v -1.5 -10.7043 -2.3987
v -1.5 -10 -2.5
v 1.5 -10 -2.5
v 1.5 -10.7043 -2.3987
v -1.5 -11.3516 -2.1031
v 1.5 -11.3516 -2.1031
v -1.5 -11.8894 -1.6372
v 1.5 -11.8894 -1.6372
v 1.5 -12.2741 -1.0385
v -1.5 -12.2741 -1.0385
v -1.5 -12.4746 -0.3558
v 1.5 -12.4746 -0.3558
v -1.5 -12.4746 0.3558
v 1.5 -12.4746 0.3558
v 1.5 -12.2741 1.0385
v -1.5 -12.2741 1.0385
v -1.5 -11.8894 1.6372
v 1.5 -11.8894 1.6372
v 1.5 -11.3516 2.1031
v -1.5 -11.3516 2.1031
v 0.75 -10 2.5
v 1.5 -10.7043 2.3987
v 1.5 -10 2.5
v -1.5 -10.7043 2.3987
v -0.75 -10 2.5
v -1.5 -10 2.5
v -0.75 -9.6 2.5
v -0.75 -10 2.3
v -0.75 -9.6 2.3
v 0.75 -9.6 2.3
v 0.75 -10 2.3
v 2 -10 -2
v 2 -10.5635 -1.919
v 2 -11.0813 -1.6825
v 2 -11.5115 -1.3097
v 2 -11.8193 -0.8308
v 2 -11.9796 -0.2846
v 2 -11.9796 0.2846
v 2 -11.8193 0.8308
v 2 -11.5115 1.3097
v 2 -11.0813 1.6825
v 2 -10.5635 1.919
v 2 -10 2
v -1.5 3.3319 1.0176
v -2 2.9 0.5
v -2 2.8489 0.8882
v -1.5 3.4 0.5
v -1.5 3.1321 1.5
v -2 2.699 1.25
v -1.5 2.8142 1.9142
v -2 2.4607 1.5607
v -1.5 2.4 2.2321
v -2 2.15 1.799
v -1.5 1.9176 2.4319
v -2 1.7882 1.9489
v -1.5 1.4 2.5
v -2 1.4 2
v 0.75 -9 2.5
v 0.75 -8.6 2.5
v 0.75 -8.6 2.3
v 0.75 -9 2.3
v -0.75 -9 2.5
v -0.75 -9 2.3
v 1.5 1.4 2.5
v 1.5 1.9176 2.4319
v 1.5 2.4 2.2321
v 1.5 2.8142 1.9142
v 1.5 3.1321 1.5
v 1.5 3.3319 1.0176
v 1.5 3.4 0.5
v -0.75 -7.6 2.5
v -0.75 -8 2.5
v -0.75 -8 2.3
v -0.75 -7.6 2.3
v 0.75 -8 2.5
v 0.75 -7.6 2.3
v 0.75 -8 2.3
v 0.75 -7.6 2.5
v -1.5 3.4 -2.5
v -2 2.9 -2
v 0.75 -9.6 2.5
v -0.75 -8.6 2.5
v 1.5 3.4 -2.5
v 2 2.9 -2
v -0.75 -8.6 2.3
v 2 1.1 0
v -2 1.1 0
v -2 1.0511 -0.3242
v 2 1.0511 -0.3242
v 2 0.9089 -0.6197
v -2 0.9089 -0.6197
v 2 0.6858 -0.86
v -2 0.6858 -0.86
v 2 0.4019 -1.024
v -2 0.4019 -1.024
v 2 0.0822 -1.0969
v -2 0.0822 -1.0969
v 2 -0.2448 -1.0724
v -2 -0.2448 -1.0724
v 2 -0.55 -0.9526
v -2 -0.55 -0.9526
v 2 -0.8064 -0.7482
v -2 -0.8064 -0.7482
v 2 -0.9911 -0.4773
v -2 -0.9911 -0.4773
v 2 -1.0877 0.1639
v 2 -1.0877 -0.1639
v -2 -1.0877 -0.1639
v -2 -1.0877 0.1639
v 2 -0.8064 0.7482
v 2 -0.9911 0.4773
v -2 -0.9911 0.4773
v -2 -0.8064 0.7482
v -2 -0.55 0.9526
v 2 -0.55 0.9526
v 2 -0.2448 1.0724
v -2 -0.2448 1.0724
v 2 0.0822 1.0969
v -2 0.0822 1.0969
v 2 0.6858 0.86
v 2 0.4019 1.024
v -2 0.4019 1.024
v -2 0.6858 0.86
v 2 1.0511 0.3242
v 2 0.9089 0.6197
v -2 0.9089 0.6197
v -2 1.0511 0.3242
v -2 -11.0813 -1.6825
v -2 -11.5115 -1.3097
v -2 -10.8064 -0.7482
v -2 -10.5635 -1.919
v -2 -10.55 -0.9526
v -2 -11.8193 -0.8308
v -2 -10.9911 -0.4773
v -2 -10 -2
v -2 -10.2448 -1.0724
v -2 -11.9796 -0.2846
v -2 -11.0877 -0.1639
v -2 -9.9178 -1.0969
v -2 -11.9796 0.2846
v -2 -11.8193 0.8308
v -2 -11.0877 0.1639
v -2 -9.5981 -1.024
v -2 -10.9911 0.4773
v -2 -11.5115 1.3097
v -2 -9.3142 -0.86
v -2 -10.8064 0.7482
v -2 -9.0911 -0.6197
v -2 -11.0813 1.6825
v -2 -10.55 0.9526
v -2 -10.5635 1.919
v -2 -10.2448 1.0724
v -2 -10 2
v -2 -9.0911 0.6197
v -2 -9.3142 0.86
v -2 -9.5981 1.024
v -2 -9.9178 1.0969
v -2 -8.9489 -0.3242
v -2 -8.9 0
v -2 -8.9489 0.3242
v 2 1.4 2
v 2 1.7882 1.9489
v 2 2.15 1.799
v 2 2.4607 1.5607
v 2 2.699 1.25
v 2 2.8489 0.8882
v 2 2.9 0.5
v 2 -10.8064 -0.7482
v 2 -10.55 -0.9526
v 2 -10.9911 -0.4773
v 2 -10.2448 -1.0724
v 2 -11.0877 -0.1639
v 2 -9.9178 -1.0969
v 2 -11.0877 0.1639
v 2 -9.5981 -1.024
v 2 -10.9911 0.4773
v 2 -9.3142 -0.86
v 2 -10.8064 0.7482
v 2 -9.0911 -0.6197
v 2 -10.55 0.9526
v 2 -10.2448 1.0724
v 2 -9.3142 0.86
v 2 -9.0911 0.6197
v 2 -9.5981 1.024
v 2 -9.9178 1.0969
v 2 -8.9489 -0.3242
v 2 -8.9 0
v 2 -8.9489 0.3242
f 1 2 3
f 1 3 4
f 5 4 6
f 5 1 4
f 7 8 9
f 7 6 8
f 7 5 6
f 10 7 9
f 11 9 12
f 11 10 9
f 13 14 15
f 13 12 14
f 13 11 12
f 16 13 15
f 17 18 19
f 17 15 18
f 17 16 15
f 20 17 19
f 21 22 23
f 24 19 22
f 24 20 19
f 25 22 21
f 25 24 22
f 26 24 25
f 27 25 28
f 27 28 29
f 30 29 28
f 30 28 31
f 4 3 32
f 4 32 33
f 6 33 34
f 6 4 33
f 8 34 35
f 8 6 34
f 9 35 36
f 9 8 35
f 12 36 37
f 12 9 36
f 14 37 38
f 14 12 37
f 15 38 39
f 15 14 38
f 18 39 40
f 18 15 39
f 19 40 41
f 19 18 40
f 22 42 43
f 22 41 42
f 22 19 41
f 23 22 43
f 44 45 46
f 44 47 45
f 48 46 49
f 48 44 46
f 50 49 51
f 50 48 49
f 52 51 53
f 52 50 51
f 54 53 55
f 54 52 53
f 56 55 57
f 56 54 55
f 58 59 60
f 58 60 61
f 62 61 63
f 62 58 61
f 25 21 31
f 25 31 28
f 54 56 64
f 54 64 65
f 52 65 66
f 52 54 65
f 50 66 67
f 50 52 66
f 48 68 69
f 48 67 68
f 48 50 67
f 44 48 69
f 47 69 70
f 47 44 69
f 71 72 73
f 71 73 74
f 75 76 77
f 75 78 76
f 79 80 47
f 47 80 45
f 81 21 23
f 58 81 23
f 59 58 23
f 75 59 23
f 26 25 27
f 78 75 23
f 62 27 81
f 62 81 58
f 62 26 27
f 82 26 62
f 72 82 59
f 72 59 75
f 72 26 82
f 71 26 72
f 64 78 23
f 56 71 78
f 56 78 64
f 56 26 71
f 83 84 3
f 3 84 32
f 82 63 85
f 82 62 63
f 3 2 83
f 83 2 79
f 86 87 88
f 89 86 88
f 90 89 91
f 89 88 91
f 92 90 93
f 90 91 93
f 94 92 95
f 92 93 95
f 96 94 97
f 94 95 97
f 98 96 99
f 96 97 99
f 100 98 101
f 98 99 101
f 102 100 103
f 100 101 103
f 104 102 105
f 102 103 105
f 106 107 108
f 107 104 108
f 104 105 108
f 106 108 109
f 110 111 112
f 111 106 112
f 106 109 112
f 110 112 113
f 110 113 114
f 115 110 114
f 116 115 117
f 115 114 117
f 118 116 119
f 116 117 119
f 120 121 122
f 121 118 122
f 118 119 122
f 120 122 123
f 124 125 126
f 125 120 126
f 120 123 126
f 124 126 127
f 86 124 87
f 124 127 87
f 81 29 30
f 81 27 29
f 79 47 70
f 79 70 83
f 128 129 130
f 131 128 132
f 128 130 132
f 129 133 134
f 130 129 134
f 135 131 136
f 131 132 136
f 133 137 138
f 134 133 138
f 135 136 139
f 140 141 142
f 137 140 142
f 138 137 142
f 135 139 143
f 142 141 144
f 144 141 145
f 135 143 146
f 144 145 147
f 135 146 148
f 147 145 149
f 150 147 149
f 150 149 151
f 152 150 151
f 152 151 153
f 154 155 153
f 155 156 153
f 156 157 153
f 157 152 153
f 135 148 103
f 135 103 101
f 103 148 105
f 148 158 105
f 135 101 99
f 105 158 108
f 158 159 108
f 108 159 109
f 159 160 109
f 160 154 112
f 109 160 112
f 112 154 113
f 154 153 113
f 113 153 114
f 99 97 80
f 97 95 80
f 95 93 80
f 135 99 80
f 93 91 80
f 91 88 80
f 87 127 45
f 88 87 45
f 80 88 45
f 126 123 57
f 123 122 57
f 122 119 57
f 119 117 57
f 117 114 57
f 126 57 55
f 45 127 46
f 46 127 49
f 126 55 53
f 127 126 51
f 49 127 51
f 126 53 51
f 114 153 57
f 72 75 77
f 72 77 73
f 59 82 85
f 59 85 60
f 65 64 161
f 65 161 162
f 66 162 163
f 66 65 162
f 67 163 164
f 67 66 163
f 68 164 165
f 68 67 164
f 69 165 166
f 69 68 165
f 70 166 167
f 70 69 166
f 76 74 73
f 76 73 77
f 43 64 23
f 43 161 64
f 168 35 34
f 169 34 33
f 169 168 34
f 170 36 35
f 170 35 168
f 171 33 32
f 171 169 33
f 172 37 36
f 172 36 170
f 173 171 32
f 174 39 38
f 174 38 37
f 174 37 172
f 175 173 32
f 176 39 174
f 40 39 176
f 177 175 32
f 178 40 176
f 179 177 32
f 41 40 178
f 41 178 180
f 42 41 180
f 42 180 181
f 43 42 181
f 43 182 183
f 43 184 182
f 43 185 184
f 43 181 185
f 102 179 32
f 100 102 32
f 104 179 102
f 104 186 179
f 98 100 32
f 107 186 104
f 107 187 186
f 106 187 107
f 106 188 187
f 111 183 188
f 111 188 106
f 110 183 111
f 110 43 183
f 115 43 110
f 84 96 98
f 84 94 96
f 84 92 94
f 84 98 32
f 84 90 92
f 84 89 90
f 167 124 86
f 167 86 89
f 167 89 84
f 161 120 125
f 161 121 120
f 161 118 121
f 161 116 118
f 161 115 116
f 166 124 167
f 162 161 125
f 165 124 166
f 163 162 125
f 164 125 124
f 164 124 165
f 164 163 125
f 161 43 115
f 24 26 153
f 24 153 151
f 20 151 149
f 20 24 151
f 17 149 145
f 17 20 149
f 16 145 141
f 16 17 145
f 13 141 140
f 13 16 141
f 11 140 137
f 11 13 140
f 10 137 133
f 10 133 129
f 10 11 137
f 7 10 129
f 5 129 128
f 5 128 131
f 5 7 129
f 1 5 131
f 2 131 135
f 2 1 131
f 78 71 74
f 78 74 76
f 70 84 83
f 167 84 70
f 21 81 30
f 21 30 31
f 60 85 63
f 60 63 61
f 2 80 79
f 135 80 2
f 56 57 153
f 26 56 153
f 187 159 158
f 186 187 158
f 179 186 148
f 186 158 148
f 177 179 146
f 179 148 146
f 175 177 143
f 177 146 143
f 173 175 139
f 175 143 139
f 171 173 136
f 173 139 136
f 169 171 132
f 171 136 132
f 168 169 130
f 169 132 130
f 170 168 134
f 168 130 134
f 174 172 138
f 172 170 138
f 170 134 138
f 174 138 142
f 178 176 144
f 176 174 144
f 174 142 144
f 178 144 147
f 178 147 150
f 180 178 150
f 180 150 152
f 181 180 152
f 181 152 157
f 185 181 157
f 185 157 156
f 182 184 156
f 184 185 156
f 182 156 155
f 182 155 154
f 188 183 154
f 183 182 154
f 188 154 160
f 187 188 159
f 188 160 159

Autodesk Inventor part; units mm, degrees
ref_plane "YZ Plane" through (0, 0, 0) normal (1, 0, 0) x (0, 1, 0)
ref_plane "XZ Plane" through (0, 0, 0) normal (0, 1, 0) x (-1, 0, 0)
ref_plane "XY Plane" through (0, 0, 0) normal (0, 0, 1) x (1, 0, 0)
sketch "Skizze1" plane through (0, 0, 0) normal (1, 0, 0) x (0, 1, 0)
  line L0 (0, 0) -> (-10, 0) construction
  circle A0 centre (0, 0) radius 1.1
  circle A1 centre (-10, 0) radius 1.1
  arc A2 (-10, 2.5) -> (-10, -2.5) centre (-10, 0) ccw
  line L1 (-10, -2.5) -> (3.4, -2.5)
  line L2 (-10, 2.5) -> (1.4, 2.5)
  arc A3 (3.4, 0.5) -> (1.4, 2.5) centre (1.4, 0.5) ccw
  line L3 (3.4, 0.5) -> (3.4, -2.5)
  dimension "d0" = 10
  dimension "d1" = 2.2
  dimension "d2" = 2.2
  dimension "d3" = 2.5
  dimension "d8" = 2
  dimension "d9" = 3.4
extrude "Extrusion1" add sketch "Skizze1" along normal mid plane 4
chamfer "Fase1" distance 0.5 angle 45 10 edges at (2, 2.8142, 1.9142) (2, -4.3, 2.5) (2, -12.5, 0) (2, -3.3, -2.5) (2, 3.4, -1) (-2, 2.8142, 1.9142) (-2, -4.3, 2.5) (-2, -12.5, 0) (-2, -3.3, -2.5) (-2, 3.4, -1)
sketch "Skizze4" plane through (-1.5, -10, 2.5) normal (0, 0, 1) x (1, 0, 0)
  line L0 (1.5, 16.58) -> (1.5, -5.68) construction
  line L1 (0, 0) -> (3, 0) construction
  line L2 (0.75, 0.4) -> (2.25, 0.4)
  line L3 (2.25, 0.4) -> (2.25, 0)
  line L4 (2.25, 0) -> (0.75, 0)
  line L5 (0.75, 0) -> (0.75, 0.4)
  line L6 (0.75, 0.4) -> (2.25, 0) construction
  line L7 (2.25, 0.4) -> (0.75, 0) construction
  point P0 (1.5, 10)
  point P1 (1.5, 0.2)
  point P2 (1.5, 0)
  dimension "d23" = 0.4
  dimension "d24" = 1.5
extrude "Extrusion3" cut sketch "Skizze4" against normal blind 0.2
pattern_linear "Rechteckige Anordnung1" count 3 spacing 1 along (0, 1, 0) of "Extrusion3"
equation "\"d2\" = d1"
properties part number "Chipanschlag T1.5"
